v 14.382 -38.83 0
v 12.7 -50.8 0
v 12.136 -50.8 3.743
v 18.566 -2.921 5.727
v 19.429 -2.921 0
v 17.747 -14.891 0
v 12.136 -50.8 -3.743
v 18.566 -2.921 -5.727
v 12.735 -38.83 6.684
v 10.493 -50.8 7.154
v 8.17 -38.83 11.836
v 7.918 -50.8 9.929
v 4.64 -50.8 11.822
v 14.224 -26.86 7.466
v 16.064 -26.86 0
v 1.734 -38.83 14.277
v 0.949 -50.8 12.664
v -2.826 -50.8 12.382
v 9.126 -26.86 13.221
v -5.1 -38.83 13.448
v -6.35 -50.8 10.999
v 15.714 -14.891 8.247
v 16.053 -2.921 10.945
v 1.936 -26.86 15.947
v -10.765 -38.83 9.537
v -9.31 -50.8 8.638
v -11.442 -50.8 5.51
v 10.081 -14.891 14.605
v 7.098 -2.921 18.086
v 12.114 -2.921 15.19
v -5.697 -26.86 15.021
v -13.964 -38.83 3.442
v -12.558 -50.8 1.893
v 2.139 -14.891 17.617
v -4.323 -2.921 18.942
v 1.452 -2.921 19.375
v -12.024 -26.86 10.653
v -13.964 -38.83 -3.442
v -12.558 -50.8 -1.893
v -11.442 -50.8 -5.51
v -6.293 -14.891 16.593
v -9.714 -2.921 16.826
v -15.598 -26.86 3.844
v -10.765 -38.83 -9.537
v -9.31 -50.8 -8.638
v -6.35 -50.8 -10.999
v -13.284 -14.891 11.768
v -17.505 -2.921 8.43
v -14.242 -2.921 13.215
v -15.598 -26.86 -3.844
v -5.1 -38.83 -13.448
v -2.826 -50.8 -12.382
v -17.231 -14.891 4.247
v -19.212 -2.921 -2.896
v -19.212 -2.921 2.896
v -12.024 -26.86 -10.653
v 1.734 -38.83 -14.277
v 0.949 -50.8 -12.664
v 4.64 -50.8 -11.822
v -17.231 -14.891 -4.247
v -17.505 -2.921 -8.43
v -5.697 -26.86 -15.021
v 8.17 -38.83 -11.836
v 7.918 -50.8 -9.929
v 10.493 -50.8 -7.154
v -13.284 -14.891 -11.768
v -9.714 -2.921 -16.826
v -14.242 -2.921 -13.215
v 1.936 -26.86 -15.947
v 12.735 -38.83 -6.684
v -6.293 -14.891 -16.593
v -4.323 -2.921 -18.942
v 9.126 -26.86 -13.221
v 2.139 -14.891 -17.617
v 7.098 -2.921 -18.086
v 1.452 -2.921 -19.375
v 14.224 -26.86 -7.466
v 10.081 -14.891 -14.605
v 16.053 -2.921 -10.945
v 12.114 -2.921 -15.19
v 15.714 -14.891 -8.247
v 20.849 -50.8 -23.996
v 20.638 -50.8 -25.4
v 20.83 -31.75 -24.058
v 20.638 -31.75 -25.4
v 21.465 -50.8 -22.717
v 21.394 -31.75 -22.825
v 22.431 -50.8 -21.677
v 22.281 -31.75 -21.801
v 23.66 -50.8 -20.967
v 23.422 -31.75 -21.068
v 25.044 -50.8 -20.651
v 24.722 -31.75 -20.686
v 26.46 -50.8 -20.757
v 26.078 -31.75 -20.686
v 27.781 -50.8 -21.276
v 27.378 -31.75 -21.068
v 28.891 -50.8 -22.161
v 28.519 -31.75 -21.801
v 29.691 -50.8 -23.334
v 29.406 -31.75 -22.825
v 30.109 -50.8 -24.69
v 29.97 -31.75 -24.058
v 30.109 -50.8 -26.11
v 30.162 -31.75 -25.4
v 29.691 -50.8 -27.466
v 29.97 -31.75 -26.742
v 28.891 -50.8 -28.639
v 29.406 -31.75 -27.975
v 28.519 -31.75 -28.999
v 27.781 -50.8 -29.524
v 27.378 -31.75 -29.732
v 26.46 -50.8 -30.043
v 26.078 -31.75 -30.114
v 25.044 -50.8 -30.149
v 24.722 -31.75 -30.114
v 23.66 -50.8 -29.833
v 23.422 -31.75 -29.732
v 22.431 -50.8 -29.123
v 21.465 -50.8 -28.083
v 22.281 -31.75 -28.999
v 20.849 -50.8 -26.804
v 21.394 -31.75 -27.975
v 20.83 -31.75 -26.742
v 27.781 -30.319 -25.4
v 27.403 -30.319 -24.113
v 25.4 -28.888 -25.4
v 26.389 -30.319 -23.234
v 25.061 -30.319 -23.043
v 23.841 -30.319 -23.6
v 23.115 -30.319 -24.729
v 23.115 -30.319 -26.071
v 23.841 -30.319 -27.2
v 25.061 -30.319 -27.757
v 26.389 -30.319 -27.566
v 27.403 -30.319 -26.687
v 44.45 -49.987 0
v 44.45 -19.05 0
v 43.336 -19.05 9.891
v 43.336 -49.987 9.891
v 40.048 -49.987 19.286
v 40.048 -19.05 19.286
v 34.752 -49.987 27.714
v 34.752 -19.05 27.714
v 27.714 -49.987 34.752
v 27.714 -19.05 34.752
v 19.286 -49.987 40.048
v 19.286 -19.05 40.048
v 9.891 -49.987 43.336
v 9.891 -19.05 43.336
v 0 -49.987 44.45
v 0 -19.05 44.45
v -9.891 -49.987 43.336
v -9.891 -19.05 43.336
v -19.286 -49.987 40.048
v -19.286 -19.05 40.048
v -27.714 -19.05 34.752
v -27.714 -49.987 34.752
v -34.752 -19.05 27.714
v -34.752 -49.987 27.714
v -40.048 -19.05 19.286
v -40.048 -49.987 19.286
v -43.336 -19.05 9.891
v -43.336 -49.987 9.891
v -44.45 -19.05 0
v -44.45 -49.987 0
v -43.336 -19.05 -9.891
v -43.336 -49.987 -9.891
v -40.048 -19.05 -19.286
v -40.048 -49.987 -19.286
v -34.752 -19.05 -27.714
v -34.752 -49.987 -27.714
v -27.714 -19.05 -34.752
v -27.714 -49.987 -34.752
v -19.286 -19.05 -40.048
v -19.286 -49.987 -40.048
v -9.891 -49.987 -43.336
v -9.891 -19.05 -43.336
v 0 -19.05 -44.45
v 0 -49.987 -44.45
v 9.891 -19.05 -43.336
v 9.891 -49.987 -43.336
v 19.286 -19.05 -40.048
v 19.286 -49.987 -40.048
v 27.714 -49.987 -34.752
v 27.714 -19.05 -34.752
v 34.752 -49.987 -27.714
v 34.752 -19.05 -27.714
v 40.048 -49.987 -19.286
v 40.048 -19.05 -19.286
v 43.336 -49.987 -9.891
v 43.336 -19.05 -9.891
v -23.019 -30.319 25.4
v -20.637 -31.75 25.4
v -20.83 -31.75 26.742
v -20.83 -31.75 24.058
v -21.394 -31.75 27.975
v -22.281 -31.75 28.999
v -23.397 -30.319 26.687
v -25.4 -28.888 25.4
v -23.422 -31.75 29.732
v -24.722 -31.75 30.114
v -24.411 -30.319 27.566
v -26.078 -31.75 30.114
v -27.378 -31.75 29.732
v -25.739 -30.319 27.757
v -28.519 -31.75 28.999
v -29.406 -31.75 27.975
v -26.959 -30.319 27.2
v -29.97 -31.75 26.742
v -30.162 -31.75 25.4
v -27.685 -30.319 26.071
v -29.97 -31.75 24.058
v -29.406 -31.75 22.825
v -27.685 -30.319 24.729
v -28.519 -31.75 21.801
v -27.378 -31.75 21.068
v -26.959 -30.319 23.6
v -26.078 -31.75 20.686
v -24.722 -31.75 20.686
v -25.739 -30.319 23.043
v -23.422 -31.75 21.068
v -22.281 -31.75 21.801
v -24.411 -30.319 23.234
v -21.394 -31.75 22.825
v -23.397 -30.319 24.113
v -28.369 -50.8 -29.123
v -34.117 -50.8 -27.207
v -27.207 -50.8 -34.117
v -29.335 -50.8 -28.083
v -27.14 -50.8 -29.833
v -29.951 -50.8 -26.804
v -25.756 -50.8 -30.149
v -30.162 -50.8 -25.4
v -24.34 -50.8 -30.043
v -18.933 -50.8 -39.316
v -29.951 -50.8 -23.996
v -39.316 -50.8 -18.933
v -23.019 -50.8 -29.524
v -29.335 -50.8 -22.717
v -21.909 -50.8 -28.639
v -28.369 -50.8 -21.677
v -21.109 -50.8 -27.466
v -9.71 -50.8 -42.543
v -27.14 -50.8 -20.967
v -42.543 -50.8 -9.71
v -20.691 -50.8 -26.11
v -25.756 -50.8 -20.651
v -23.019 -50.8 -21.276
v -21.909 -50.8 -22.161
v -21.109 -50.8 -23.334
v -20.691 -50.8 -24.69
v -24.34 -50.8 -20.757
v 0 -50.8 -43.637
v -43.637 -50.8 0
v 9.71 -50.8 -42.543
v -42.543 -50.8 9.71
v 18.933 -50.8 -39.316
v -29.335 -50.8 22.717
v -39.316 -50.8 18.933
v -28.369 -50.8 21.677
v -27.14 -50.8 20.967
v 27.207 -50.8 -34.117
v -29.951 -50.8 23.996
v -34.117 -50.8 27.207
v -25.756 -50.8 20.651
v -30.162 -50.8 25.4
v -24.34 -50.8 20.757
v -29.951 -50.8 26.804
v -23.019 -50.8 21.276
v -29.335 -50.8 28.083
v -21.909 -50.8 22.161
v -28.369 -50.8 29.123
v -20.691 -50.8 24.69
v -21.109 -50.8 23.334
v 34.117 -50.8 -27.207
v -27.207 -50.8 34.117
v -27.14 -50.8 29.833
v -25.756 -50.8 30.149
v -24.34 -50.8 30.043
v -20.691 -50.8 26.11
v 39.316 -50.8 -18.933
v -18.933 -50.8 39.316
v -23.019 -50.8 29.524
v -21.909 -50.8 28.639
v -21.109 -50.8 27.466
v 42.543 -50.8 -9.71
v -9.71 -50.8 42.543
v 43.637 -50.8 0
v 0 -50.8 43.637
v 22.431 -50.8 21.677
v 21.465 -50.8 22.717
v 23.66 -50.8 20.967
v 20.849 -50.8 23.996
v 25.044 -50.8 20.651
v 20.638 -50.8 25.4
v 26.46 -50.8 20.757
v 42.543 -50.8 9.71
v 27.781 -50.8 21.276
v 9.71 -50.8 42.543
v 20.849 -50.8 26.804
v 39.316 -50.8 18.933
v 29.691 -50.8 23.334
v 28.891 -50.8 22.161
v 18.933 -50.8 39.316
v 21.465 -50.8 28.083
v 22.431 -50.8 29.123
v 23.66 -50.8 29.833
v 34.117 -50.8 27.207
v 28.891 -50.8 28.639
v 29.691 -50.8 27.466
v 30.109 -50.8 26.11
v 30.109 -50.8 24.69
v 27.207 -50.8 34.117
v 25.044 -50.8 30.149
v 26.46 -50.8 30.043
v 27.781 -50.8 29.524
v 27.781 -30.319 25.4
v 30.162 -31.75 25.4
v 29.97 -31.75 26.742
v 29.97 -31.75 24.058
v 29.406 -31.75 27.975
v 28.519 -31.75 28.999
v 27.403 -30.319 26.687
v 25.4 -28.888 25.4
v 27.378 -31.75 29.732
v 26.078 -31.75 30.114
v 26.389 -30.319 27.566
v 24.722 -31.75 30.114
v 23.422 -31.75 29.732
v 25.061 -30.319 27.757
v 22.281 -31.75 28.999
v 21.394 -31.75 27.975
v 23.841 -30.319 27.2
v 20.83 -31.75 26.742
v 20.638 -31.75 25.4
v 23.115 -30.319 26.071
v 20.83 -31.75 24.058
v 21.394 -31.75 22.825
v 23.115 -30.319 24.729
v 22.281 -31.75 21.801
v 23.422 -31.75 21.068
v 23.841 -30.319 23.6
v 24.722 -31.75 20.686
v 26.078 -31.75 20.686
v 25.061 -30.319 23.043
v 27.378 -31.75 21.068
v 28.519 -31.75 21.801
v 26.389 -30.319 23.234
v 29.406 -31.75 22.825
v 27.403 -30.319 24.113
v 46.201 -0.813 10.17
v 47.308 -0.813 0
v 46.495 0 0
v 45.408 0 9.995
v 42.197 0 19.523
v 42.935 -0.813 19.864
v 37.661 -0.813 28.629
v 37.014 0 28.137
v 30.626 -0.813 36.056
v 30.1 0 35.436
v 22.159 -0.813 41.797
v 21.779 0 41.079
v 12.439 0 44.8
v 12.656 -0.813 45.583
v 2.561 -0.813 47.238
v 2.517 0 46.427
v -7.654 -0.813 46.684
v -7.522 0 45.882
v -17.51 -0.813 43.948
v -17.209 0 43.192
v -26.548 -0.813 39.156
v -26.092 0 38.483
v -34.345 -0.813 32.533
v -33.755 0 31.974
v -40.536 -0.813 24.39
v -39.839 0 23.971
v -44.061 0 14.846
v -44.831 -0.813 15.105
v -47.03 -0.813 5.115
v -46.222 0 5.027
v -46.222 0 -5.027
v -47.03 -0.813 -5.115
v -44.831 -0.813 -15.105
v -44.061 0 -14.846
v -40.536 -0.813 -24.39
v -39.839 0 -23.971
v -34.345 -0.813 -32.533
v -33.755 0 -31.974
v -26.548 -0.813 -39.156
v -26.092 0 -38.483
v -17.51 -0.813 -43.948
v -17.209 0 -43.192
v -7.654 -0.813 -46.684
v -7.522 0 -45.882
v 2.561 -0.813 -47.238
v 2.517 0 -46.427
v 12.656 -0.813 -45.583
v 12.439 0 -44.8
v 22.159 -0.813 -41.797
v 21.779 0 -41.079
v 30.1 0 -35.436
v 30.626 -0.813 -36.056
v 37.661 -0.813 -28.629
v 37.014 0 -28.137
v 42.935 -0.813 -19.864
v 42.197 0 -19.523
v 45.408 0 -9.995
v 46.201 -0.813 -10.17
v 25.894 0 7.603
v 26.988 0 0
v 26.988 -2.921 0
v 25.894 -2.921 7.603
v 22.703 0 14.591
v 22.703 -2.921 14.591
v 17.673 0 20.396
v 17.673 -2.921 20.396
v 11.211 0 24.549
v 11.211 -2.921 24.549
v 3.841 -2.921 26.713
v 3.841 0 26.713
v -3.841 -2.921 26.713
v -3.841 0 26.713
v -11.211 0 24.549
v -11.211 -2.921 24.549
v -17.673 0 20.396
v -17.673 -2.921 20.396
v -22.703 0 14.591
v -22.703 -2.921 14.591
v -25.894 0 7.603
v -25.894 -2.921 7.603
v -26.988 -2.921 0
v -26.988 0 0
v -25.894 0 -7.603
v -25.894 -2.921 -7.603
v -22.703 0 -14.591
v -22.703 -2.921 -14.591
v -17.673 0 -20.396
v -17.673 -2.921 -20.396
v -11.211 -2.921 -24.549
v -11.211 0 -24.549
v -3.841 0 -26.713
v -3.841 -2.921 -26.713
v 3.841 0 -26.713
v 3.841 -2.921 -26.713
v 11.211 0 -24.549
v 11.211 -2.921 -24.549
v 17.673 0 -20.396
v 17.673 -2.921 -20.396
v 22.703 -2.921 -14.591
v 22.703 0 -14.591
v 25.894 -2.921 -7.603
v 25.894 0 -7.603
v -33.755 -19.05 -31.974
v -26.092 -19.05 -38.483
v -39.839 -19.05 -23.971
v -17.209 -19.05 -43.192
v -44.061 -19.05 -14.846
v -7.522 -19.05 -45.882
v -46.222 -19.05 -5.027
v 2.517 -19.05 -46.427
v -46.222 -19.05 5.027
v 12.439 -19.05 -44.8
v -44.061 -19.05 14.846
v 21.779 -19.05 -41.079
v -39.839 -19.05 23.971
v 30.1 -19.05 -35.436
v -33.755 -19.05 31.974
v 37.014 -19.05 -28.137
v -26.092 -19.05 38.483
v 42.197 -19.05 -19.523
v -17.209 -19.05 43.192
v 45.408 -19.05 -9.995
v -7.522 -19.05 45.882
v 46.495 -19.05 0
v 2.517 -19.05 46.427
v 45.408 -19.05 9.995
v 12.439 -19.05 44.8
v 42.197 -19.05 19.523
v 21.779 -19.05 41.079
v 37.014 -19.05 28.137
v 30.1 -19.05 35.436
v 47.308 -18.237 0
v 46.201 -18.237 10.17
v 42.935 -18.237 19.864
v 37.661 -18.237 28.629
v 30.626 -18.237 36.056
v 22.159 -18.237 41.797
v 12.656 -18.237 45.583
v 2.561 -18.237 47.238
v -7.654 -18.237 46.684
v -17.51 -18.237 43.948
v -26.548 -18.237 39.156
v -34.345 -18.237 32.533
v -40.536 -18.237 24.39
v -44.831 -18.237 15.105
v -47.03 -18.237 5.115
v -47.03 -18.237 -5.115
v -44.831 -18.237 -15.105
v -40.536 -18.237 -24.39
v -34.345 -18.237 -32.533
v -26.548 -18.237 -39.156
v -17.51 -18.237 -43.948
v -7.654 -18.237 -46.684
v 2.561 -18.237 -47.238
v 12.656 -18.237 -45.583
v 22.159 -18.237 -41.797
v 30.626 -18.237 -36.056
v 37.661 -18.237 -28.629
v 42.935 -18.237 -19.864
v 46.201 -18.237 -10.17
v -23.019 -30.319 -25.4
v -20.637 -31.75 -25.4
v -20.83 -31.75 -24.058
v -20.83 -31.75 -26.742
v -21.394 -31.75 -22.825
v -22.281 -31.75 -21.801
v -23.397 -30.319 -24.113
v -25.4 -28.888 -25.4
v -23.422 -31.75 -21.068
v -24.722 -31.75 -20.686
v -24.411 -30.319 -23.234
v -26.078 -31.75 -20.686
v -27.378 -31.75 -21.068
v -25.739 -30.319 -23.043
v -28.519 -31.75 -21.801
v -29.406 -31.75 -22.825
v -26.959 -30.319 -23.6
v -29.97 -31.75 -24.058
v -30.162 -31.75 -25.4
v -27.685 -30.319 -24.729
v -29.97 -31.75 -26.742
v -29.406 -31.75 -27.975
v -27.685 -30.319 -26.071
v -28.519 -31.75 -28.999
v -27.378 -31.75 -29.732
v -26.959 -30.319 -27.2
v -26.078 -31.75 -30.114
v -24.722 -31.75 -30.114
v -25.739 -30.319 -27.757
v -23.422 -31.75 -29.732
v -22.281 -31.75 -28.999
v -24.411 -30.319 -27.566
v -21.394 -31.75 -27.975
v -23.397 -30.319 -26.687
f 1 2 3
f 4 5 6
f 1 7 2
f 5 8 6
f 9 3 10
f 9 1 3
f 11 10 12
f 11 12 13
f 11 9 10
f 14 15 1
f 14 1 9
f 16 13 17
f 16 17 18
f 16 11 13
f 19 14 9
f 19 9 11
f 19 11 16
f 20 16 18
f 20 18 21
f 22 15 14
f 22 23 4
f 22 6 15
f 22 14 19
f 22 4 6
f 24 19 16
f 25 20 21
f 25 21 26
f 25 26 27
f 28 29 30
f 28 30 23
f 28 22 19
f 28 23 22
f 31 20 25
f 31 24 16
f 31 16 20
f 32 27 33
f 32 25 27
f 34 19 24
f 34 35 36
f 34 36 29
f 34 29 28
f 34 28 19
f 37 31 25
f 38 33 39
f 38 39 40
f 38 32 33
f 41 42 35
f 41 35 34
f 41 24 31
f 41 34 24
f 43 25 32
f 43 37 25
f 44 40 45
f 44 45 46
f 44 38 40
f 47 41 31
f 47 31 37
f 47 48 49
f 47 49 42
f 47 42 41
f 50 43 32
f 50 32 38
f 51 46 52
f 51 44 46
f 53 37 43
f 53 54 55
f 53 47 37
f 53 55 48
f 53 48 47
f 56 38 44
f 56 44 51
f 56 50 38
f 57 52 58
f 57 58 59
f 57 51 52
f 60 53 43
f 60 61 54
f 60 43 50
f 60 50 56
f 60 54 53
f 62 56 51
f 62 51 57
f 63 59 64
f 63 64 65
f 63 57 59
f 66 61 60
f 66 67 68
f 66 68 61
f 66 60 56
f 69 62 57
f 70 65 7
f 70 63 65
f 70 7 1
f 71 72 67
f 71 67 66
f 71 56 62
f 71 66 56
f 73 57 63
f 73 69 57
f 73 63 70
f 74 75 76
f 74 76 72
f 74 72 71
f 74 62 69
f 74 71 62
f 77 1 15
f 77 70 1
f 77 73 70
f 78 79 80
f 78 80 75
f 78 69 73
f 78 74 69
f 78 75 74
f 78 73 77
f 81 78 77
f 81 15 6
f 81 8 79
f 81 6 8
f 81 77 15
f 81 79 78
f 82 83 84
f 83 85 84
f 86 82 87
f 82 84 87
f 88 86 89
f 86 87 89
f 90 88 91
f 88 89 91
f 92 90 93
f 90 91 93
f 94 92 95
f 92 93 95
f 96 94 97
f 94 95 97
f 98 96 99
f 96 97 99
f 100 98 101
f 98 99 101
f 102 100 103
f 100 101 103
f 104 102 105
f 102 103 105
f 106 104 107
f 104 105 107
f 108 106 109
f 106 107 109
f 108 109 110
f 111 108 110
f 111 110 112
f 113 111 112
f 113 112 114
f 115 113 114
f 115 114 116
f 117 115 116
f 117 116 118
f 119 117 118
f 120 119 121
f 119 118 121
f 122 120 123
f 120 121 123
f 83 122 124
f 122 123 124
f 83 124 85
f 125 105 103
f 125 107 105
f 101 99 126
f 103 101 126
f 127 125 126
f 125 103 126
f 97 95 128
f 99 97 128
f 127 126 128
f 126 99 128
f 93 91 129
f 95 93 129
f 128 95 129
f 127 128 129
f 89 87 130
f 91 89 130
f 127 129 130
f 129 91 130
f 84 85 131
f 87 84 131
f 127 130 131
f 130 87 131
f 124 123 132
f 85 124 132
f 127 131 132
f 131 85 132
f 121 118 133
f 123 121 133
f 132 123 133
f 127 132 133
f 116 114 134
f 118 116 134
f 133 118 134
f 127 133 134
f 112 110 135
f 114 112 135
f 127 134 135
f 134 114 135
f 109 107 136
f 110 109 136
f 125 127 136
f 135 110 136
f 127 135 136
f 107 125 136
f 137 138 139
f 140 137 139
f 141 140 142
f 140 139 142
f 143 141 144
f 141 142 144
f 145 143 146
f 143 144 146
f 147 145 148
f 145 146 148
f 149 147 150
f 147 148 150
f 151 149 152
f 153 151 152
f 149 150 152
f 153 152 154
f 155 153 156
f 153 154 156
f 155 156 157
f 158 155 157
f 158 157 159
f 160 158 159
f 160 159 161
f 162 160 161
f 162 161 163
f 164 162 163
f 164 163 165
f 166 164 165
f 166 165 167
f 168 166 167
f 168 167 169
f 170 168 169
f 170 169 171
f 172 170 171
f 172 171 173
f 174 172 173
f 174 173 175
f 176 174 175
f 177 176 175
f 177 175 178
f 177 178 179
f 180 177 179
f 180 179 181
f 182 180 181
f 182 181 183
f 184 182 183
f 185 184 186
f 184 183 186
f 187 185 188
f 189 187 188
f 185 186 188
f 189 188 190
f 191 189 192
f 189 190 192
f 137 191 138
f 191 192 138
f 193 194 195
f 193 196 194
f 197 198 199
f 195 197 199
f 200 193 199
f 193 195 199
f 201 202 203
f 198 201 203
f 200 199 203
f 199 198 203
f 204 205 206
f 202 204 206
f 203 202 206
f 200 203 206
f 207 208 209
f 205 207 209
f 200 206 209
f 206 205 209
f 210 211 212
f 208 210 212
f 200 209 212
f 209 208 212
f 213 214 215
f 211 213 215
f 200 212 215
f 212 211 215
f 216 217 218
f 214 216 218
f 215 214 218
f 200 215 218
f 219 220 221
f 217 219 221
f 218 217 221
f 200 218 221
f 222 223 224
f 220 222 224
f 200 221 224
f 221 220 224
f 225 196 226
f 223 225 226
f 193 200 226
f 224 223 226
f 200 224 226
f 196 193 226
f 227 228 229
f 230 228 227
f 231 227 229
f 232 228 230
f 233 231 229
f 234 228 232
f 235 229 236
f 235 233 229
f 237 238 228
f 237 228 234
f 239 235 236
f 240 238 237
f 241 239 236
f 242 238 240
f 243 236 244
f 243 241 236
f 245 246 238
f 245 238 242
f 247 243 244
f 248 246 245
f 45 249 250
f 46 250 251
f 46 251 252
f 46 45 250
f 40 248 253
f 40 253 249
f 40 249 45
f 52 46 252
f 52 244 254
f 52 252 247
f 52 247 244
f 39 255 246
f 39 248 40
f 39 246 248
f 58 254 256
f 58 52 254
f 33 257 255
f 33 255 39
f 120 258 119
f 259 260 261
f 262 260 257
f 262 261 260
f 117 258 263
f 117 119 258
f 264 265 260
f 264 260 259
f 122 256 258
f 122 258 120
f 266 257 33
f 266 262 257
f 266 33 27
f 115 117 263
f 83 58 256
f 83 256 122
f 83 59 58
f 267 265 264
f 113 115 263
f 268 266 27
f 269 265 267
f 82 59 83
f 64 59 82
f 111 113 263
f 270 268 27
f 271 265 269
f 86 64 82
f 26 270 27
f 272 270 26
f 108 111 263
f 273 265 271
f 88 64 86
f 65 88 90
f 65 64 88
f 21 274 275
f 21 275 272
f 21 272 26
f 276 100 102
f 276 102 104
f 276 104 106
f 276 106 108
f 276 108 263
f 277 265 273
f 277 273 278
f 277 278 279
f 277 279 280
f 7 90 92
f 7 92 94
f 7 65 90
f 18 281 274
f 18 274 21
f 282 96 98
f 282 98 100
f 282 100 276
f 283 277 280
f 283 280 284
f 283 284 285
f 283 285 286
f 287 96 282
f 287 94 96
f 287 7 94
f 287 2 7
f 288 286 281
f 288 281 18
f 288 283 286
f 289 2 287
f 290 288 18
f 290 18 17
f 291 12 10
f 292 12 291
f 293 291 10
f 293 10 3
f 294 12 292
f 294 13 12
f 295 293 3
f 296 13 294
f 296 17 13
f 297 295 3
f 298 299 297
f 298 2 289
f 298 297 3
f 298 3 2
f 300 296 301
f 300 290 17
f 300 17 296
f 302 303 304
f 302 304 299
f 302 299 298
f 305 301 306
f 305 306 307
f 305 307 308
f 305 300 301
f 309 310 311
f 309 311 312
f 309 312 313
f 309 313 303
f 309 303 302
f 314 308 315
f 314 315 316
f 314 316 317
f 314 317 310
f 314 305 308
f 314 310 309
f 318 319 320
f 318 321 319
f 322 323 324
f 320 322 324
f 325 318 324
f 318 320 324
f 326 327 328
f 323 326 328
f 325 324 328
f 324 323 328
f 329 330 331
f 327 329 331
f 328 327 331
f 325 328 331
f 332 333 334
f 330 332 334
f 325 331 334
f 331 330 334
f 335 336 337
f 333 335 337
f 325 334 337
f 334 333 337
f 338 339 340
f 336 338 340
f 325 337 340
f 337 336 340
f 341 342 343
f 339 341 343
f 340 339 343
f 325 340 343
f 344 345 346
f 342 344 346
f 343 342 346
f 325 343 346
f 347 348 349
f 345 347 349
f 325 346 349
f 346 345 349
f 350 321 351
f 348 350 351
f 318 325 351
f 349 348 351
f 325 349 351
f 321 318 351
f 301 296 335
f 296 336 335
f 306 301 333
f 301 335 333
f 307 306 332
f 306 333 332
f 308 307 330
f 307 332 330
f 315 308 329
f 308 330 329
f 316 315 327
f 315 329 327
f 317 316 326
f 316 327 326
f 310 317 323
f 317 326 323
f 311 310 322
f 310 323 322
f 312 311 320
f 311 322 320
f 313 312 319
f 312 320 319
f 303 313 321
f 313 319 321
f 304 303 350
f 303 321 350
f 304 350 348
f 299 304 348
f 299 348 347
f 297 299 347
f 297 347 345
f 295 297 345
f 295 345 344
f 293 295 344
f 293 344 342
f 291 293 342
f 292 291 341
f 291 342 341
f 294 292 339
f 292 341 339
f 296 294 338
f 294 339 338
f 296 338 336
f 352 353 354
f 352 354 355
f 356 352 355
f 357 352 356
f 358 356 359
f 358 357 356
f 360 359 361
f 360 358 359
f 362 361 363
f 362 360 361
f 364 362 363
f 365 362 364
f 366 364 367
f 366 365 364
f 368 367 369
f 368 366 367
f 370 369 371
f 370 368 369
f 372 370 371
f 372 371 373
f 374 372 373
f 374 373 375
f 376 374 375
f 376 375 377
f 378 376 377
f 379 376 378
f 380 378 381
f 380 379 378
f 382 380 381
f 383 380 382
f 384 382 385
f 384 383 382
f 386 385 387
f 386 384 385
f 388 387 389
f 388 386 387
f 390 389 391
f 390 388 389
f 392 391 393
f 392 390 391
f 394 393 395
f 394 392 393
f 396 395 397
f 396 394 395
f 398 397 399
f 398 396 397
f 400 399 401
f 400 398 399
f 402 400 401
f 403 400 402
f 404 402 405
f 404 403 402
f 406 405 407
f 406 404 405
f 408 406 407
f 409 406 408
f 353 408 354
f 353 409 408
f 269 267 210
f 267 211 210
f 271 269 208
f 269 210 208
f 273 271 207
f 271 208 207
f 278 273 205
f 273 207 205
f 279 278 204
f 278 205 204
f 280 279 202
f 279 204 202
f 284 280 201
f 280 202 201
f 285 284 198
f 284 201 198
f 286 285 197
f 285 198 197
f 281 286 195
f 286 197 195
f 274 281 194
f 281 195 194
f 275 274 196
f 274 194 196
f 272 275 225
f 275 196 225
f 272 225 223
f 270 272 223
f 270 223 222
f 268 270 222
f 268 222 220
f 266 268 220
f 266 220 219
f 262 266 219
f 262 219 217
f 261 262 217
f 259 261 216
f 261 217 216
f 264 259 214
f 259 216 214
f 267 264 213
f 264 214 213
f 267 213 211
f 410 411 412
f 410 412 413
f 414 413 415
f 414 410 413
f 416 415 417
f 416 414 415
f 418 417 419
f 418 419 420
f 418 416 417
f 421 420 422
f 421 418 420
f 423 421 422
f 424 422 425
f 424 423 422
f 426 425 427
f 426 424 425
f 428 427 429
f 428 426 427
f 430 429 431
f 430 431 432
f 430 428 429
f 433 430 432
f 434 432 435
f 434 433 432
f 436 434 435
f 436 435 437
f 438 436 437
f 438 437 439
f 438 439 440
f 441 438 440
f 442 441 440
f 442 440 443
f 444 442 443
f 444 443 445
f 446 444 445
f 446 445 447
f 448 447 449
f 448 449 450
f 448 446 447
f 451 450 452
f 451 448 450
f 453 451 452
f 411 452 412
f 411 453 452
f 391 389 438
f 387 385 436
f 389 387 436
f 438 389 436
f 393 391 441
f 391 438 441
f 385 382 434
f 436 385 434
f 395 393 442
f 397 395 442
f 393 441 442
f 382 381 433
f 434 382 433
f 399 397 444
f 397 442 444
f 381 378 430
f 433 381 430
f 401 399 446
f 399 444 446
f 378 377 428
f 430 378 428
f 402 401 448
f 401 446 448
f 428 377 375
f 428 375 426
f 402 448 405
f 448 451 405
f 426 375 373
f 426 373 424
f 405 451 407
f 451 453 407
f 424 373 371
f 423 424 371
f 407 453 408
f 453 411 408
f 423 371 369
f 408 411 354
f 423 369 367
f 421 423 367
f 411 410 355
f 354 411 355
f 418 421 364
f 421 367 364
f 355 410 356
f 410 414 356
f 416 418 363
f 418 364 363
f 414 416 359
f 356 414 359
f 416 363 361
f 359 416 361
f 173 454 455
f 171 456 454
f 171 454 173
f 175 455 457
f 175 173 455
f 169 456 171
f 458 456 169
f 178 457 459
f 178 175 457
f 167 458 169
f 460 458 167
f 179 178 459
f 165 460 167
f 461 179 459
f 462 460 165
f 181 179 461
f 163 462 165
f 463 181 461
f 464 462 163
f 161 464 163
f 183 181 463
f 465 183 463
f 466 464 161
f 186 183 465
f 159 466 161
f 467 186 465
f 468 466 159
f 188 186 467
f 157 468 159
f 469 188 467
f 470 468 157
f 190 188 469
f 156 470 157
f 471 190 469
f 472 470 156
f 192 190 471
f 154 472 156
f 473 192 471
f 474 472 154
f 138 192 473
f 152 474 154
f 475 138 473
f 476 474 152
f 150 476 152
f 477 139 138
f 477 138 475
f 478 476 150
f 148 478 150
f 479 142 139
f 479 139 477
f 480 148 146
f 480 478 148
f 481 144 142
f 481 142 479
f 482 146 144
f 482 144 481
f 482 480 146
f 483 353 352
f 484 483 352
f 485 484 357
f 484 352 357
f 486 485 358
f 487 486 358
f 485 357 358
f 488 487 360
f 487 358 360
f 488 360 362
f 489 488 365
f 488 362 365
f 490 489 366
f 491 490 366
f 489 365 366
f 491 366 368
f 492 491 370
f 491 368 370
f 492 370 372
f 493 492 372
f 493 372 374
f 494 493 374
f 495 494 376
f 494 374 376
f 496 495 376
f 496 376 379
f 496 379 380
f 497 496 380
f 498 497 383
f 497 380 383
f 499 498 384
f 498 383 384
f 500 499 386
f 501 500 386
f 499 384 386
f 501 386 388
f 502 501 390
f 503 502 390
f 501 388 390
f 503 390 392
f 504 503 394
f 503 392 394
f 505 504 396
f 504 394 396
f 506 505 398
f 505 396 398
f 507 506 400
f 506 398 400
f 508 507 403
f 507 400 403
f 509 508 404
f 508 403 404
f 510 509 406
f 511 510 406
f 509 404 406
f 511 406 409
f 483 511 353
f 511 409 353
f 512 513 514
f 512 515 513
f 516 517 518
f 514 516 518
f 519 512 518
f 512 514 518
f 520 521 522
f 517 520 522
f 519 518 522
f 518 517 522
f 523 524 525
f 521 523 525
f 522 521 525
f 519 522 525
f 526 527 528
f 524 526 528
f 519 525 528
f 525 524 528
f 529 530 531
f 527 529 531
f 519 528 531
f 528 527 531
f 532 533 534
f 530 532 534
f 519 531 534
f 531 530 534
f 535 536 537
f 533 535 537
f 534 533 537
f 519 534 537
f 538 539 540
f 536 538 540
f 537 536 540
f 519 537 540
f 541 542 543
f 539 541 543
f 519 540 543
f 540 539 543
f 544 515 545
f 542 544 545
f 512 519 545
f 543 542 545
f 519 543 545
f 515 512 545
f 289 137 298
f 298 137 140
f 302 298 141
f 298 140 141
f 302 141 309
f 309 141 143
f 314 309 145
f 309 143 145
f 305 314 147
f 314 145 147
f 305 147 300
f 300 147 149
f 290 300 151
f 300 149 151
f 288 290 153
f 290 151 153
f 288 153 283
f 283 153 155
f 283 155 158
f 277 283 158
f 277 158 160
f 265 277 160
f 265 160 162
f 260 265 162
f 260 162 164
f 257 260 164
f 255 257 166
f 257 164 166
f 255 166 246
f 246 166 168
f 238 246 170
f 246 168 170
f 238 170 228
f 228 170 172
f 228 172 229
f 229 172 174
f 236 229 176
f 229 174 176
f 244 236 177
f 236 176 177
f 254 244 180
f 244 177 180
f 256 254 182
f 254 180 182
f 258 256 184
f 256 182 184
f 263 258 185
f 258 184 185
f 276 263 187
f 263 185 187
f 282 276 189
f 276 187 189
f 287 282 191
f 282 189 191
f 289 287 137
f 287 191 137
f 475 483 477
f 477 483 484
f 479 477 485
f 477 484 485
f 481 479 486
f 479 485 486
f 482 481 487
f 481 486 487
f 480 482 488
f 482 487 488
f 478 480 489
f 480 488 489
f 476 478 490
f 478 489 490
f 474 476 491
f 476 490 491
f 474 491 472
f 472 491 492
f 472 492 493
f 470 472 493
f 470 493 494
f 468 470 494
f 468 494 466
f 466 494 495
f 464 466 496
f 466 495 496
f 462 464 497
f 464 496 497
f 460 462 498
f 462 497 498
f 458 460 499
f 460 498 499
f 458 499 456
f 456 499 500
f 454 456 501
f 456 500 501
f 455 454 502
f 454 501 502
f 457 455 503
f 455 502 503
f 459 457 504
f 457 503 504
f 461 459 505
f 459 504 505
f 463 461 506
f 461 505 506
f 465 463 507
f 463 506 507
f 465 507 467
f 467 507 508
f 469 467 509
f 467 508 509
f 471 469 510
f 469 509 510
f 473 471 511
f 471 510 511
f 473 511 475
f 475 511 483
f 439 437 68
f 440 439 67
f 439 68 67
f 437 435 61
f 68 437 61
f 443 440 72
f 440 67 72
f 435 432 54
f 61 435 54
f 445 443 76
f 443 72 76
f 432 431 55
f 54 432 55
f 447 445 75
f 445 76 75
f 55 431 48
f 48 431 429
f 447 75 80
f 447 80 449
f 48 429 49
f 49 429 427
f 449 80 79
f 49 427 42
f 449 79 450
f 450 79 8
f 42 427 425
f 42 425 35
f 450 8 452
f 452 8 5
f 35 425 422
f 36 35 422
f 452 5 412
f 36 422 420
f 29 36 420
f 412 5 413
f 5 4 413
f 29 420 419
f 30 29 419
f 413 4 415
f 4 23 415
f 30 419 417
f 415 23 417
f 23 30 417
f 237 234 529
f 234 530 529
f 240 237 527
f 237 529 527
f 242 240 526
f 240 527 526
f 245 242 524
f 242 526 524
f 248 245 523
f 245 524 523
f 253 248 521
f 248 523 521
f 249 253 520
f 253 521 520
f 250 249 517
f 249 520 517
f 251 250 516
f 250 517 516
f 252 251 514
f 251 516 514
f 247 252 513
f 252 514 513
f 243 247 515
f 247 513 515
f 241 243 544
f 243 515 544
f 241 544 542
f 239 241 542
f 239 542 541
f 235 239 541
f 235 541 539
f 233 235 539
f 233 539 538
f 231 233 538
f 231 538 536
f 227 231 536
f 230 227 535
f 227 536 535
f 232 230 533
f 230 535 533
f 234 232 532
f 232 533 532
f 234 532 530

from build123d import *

# Parameters (mm, degrees)
F0_R     = 47.3075
F0_R_2   = 44.45
F1_DEPTH = 19.05
F0_R_3   = 12.7
F2_DEPTH = 50.8
F3_SIZE2 = 7.139464
F3_SIZE  = 50.79999
F4_R     = 26.9875
F4_R_2   = 12.7
F5_DEPTH = 2.921
F7_D     = 9.525
F7_DEPTH = 19.05
F7_TIP   = 2.8615986981
F8_SIZE  = 0.8128


# Not quite as in the source:
# - a fillet or chamfer is up to 0.001 mm smaller than in the source, because OpenCascade refuses the exact size


with BuildPart() as f1:
    # F0 (on Front) → F1 (new body)
    with BuildSketch(Plane.XZ):
        Circle(F0_R)
        Circle(F0_R_2, mode=Mode.SUBTRACT)
    extrude(amount=F1_DEPTH)

    # F0 (on Front) → F2 (join)
    with BuildSketch(Plane.XZ):
        Circle(F0_R_2)
        Circle(F0_R_3, mode=Mode.SUBTRACT)
    extrude(amount=F2_DEPTH)

    # F3 (size 50.8 and 7.1394744029 in the source; OpenCascade refuses exactly that, so slightly less here)
    f3_edges = [f1.edges().sort_by_distance(p)[0] for p in [
        (-12.7, 0, 0),
    ]]
    f3_side = f1.faces().sort_by_distance((-12.7, -25.4, 0))[0]
    chamfer(f3_edges, length=F3_SIZE, length2=F3_SIZE2, reference=f3_side)

    # F4 (on face) → F5 (cut)
    with BuildSketch(Plane.XZ):
        Circle(F4_R)
        Circle(F4_R_2, mode=Mode.SUBTRACT)
    extrude(amount=F5_DEPTH, mode=Mode.SUBTRACT)

    # F7
    with Locations(Plane.XZ.offset(50.8)):
        with Locations((-25.4, 25.4), (25.4, 25.4), (-25.4, -25.4), (25.4, -25.4)):
            Hole(F7_D / 2, depth=F7_DEPTH)
            with Locations((0, 0, -(F7_DEPTH + F7_TIP / 2))):  # 118° drill point
                Cone(0, F7_D / 2, F7_TIP, mode=Mode.SUBTRACT)

    # F8
    f8_edges = [f1.edges().sort_by_distance(p)[0] for p in [
        (-44.45, -50.8, 0),
        (-47.3075, -19.05, 0),
        (-47.3075, 0, 0),
    ]]
    chamfer(f8_edges, length=F8_SIZE)


solid = f1.part
